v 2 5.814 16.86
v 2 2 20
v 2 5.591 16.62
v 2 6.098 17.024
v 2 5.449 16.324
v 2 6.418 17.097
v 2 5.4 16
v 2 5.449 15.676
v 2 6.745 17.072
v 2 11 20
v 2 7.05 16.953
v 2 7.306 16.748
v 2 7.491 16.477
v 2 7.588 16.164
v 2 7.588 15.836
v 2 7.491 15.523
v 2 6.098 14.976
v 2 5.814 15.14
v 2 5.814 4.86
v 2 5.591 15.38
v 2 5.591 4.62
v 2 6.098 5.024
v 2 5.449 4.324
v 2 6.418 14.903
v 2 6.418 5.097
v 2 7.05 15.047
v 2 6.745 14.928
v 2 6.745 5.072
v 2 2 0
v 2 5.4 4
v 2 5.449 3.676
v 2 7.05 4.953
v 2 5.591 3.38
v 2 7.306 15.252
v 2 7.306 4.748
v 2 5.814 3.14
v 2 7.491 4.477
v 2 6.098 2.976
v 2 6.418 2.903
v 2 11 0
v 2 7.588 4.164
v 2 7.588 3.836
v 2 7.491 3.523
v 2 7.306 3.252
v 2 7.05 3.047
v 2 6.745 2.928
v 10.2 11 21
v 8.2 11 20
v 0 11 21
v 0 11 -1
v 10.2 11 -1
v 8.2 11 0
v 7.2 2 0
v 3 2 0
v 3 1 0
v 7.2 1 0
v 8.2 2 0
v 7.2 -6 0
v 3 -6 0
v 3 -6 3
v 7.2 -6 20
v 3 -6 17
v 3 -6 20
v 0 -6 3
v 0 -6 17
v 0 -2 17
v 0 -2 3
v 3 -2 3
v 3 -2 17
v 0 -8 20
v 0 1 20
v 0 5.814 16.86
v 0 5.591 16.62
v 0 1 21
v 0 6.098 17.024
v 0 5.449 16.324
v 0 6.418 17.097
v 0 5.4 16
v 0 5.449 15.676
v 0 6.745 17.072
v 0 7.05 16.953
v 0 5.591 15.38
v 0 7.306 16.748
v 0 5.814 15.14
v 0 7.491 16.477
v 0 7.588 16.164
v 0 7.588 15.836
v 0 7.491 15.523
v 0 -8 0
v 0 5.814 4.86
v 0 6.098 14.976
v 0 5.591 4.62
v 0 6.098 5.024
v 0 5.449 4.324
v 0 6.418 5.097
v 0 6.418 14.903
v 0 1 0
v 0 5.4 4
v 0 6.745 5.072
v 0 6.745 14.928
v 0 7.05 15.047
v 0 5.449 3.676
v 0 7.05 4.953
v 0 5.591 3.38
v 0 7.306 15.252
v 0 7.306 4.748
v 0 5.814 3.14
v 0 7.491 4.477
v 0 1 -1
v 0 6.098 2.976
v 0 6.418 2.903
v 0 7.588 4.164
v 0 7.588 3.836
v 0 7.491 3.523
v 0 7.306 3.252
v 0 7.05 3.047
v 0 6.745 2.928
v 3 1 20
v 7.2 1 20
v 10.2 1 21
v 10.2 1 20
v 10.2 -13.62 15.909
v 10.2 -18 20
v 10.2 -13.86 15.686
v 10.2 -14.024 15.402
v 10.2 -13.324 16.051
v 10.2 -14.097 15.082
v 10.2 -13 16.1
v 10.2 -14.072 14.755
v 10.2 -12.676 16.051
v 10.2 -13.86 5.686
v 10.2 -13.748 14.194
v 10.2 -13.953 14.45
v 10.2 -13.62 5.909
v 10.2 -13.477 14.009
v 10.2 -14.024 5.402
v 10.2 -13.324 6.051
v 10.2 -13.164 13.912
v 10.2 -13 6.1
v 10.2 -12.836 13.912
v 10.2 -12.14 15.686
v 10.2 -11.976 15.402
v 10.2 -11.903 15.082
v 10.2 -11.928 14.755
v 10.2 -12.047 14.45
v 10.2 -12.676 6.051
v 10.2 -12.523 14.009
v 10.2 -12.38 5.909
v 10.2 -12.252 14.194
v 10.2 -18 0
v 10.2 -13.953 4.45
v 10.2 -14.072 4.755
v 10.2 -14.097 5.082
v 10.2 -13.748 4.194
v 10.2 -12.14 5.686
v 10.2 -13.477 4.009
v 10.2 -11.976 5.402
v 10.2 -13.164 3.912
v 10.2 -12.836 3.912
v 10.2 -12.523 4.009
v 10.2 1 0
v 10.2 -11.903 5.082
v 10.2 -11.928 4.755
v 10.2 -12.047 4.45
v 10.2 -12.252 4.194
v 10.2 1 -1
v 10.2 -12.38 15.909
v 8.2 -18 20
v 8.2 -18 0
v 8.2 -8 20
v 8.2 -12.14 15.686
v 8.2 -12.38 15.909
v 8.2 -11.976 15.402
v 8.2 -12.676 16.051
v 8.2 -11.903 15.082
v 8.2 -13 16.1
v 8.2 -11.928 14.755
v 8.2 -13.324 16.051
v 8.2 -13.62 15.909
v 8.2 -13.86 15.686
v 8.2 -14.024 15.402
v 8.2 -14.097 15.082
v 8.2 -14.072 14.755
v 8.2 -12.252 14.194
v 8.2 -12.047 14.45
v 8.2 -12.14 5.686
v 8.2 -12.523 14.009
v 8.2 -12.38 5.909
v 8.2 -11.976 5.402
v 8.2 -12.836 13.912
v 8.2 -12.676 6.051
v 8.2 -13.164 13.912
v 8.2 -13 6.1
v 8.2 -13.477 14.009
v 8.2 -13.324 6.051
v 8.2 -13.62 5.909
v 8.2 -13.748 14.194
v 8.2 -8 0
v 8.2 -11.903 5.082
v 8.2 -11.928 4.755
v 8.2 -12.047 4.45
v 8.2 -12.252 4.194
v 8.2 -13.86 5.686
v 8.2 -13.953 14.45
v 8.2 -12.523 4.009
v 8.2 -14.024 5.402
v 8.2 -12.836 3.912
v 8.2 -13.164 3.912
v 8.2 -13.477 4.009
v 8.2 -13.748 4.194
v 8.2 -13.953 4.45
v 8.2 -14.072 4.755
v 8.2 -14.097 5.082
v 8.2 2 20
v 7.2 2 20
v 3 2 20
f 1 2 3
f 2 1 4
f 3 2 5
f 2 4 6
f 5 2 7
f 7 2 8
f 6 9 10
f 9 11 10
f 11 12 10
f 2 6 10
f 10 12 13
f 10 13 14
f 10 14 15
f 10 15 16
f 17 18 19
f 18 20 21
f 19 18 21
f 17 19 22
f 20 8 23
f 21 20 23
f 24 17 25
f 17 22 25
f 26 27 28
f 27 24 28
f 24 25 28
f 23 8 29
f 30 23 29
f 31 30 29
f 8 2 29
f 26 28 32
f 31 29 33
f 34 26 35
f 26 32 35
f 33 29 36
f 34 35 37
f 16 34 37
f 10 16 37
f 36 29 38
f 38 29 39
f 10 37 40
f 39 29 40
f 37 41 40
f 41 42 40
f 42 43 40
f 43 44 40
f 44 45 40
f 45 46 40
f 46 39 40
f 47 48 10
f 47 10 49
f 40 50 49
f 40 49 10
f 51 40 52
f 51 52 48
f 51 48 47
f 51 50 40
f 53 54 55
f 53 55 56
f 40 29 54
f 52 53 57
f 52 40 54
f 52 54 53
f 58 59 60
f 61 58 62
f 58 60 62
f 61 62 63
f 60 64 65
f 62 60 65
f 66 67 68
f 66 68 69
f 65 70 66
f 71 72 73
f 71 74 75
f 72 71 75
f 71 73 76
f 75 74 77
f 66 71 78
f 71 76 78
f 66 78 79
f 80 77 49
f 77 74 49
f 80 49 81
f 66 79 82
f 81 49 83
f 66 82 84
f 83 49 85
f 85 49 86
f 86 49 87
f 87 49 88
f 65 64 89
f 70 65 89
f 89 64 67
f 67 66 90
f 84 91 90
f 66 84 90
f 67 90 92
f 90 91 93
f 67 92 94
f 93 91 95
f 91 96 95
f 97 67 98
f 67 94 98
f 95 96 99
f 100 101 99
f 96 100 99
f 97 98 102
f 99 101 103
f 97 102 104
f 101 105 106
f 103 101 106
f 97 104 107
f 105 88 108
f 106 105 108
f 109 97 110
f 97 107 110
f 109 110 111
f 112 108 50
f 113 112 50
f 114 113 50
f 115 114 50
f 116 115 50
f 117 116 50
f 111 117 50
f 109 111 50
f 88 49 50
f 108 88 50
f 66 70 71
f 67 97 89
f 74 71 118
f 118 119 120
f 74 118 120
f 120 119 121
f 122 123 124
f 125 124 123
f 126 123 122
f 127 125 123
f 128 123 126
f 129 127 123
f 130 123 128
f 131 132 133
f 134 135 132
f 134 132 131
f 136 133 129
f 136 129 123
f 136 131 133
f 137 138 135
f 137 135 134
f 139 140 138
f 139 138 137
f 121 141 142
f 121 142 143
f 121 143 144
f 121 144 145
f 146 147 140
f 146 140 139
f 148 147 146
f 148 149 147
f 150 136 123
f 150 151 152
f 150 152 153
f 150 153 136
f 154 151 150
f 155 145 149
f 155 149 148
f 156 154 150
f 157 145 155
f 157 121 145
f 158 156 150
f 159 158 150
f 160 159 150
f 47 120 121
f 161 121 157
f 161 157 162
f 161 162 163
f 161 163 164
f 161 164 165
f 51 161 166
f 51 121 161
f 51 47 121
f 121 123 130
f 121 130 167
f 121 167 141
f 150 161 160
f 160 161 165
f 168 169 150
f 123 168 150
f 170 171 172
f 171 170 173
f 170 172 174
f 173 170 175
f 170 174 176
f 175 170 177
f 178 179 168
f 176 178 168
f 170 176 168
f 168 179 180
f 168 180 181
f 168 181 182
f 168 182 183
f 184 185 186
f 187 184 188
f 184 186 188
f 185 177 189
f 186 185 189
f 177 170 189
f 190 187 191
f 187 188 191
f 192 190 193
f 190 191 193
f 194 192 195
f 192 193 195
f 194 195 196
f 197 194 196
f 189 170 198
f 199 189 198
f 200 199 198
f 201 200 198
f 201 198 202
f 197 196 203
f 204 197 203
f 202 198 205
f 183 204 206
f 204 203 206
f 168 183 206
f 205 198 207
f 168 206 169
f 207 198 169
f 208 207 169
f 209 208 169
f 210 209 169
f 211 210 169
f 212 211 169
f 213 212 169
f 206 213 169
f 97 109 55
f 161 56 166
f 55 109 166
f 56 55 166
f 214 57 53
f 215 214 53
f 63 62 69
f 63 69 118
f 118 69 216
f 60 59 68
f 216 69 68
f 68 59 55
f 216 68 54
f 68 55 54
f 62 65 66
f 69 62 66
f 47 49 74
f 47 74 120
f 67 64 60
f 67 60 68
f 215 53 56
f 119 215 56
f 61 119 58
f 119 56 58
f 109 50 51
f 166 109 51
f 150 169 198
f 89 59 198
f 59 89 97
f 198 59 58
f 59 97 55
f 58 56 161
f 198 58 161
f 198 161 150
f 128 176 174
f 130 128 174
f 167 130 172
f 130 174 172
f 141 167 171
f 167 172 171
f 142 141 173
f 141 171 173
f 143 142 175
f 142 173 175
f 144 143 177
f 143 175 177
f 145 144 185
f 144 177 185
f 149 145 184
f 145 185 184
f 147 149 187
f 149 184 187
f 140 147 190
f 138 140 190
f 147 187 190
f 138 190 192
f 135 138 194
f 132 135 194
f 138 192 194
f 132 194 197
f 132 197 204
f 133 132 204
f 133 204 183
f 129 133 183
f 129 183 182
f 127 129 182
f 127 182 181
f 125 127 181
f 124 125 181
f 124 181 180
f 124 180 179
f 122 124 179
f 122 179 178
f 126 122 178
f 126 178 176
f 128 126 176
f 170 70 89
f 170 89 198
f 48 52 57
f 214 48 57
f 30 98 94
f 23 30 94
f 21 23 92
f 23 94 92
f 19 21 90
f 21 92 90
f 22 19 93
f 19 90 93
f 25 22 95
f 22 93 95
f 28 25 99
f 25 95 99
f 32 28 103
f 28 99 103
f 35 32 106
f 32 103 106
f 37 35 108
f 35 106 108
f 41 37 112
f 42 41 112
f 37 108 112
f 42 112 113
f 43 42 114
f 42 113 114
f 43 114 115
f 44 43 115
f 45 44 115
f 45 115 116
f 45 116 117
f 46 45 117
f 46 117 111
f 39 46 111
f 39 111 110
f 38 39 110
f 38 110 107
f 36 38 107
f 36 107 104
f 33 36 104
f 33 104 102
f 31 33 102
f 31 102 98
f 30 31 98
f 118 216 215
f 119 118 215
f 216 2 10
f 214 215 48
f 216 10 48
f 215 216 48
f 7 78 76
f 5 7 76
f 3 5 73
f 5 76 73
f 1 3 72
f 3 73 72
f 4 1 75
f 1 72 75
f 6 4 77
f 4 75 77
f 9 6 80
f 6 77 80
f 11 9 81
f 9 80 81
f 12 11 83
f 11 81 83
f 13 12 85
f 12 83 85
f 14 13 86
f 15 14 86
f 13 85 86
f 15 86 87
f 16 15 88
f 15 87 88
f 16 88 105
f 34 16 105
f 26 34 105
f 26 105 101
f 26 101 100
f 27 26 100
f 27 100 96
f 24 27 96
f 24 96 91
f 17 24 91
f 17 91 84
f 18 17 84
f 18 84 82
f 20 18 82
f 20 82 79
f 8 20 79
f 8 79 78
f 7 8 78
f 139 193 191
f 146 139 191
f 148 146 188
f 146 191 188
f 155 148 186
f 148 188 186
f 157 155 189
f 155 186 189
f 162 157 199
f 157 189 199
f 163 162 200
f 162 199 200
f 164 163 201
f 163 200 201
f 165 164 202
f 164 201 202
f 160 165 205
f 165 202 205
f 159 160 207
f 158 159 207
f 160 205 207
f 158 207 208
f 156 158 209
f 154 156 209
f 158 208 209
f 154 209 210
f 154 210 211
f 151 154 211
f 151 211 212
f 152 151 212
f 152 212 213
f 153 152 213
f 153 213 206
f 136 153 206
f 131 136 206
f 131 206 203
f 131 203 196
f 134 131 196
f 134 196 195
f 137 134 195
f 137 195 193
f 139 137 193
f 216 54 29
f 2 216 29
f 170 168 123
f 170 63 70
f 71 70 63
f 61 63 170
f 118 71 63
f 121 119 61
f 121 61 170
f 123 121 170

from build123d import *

# Parameters (mm, degrees)
BOSS_EXTRUDE1_DEPTH  = 20
SKETCH2_W            = 14
SKETCH2_H            = 4
CUT_EXTRUDE1_DEPTH   = 3
SKETCH9_W            = 10.2
SKETCH9_H            = 1
BOSS_EXTRUDE11_DEPTH = 10
SKETCH10_R           = 1.1
CUT_EXTRUDE2_DEPTH   = 5
SKETCH11_R           = 1.1
CUT_EXTRUDE3_DEPTH   = 5


with BuildPart() as part:
    # Sketch1 → Boss-Extrude1 (new body)
    with BuildSketch(Plane.XY):
        Polygon((0, 11), (0, -8), (8.2, -8), (8.2, -18), (10.2, -18), (10.2, -6), (10.2, 11), (8.2, 11), (8.2, 2), (7.2, 2), (7.2, -6), (3, -6), (3, 2), (2, 2), (2, 11), align=None)
    extrude(amount=BOSS_EXTRUDE1_DEPTH)

    # Sketch2 → Cut-Extrude1 (cut)
    with BuildSketch(Plane.ZY):
        with Locations((10, -4)):
            Rectangle(SKETCH2_W, SKETCH2_H)
    extrude(amount=-CUT_EXTRUDE1_DEPTH, mode=Mode.SUBTRACT)

    # Sketch9 → Boss-Extrude11 (add)
    with BuildSketch(Plane(origin=(0, 11, 0), x_dir=(1, 0, 0), z_dir=(0, 1, 0))):
        with Locations((5.1, 0.5)):
            Rectangle(SKETCH9_W, SKETCH9_H)
        with Locations((5.1, -20.5)):
            Rectangle(SKETCH9_W, SKETCH9_H)
    extrude(amount=-BOSS_EXTRUDE11_DEPTH)

    # Sketch10 → Cut-Extrude2 (cut)
    with BuildSketch(Plane.ZY):
        with Locations(Location((4, 6.5, 0), (0, 0, 270))):
            Circle(SKETCH10_R)
        with Locations(Location((16, 6.5, 0), (0, 0, 270))):
            Circle(SKETCH10_R)
    extrude(amount=-CUT_EXTRUDE2_DEPTH, mode=Mode.SUBTRACT)

    # Sketch11 → Cut-Extrude3 (cut)
    with BuildSketch(Plane.ZY.offset(-8.2)):
        with Locations((5, -13)):
            Circle(SKETCH11_R)
        with Locations((15, -13)):
            Circle(SKETCH11_R)
    extrude(amount=-CUT_EXTRUDE3_DEPTH, mode=Mode.SUBTRACT)


solid = part.part
